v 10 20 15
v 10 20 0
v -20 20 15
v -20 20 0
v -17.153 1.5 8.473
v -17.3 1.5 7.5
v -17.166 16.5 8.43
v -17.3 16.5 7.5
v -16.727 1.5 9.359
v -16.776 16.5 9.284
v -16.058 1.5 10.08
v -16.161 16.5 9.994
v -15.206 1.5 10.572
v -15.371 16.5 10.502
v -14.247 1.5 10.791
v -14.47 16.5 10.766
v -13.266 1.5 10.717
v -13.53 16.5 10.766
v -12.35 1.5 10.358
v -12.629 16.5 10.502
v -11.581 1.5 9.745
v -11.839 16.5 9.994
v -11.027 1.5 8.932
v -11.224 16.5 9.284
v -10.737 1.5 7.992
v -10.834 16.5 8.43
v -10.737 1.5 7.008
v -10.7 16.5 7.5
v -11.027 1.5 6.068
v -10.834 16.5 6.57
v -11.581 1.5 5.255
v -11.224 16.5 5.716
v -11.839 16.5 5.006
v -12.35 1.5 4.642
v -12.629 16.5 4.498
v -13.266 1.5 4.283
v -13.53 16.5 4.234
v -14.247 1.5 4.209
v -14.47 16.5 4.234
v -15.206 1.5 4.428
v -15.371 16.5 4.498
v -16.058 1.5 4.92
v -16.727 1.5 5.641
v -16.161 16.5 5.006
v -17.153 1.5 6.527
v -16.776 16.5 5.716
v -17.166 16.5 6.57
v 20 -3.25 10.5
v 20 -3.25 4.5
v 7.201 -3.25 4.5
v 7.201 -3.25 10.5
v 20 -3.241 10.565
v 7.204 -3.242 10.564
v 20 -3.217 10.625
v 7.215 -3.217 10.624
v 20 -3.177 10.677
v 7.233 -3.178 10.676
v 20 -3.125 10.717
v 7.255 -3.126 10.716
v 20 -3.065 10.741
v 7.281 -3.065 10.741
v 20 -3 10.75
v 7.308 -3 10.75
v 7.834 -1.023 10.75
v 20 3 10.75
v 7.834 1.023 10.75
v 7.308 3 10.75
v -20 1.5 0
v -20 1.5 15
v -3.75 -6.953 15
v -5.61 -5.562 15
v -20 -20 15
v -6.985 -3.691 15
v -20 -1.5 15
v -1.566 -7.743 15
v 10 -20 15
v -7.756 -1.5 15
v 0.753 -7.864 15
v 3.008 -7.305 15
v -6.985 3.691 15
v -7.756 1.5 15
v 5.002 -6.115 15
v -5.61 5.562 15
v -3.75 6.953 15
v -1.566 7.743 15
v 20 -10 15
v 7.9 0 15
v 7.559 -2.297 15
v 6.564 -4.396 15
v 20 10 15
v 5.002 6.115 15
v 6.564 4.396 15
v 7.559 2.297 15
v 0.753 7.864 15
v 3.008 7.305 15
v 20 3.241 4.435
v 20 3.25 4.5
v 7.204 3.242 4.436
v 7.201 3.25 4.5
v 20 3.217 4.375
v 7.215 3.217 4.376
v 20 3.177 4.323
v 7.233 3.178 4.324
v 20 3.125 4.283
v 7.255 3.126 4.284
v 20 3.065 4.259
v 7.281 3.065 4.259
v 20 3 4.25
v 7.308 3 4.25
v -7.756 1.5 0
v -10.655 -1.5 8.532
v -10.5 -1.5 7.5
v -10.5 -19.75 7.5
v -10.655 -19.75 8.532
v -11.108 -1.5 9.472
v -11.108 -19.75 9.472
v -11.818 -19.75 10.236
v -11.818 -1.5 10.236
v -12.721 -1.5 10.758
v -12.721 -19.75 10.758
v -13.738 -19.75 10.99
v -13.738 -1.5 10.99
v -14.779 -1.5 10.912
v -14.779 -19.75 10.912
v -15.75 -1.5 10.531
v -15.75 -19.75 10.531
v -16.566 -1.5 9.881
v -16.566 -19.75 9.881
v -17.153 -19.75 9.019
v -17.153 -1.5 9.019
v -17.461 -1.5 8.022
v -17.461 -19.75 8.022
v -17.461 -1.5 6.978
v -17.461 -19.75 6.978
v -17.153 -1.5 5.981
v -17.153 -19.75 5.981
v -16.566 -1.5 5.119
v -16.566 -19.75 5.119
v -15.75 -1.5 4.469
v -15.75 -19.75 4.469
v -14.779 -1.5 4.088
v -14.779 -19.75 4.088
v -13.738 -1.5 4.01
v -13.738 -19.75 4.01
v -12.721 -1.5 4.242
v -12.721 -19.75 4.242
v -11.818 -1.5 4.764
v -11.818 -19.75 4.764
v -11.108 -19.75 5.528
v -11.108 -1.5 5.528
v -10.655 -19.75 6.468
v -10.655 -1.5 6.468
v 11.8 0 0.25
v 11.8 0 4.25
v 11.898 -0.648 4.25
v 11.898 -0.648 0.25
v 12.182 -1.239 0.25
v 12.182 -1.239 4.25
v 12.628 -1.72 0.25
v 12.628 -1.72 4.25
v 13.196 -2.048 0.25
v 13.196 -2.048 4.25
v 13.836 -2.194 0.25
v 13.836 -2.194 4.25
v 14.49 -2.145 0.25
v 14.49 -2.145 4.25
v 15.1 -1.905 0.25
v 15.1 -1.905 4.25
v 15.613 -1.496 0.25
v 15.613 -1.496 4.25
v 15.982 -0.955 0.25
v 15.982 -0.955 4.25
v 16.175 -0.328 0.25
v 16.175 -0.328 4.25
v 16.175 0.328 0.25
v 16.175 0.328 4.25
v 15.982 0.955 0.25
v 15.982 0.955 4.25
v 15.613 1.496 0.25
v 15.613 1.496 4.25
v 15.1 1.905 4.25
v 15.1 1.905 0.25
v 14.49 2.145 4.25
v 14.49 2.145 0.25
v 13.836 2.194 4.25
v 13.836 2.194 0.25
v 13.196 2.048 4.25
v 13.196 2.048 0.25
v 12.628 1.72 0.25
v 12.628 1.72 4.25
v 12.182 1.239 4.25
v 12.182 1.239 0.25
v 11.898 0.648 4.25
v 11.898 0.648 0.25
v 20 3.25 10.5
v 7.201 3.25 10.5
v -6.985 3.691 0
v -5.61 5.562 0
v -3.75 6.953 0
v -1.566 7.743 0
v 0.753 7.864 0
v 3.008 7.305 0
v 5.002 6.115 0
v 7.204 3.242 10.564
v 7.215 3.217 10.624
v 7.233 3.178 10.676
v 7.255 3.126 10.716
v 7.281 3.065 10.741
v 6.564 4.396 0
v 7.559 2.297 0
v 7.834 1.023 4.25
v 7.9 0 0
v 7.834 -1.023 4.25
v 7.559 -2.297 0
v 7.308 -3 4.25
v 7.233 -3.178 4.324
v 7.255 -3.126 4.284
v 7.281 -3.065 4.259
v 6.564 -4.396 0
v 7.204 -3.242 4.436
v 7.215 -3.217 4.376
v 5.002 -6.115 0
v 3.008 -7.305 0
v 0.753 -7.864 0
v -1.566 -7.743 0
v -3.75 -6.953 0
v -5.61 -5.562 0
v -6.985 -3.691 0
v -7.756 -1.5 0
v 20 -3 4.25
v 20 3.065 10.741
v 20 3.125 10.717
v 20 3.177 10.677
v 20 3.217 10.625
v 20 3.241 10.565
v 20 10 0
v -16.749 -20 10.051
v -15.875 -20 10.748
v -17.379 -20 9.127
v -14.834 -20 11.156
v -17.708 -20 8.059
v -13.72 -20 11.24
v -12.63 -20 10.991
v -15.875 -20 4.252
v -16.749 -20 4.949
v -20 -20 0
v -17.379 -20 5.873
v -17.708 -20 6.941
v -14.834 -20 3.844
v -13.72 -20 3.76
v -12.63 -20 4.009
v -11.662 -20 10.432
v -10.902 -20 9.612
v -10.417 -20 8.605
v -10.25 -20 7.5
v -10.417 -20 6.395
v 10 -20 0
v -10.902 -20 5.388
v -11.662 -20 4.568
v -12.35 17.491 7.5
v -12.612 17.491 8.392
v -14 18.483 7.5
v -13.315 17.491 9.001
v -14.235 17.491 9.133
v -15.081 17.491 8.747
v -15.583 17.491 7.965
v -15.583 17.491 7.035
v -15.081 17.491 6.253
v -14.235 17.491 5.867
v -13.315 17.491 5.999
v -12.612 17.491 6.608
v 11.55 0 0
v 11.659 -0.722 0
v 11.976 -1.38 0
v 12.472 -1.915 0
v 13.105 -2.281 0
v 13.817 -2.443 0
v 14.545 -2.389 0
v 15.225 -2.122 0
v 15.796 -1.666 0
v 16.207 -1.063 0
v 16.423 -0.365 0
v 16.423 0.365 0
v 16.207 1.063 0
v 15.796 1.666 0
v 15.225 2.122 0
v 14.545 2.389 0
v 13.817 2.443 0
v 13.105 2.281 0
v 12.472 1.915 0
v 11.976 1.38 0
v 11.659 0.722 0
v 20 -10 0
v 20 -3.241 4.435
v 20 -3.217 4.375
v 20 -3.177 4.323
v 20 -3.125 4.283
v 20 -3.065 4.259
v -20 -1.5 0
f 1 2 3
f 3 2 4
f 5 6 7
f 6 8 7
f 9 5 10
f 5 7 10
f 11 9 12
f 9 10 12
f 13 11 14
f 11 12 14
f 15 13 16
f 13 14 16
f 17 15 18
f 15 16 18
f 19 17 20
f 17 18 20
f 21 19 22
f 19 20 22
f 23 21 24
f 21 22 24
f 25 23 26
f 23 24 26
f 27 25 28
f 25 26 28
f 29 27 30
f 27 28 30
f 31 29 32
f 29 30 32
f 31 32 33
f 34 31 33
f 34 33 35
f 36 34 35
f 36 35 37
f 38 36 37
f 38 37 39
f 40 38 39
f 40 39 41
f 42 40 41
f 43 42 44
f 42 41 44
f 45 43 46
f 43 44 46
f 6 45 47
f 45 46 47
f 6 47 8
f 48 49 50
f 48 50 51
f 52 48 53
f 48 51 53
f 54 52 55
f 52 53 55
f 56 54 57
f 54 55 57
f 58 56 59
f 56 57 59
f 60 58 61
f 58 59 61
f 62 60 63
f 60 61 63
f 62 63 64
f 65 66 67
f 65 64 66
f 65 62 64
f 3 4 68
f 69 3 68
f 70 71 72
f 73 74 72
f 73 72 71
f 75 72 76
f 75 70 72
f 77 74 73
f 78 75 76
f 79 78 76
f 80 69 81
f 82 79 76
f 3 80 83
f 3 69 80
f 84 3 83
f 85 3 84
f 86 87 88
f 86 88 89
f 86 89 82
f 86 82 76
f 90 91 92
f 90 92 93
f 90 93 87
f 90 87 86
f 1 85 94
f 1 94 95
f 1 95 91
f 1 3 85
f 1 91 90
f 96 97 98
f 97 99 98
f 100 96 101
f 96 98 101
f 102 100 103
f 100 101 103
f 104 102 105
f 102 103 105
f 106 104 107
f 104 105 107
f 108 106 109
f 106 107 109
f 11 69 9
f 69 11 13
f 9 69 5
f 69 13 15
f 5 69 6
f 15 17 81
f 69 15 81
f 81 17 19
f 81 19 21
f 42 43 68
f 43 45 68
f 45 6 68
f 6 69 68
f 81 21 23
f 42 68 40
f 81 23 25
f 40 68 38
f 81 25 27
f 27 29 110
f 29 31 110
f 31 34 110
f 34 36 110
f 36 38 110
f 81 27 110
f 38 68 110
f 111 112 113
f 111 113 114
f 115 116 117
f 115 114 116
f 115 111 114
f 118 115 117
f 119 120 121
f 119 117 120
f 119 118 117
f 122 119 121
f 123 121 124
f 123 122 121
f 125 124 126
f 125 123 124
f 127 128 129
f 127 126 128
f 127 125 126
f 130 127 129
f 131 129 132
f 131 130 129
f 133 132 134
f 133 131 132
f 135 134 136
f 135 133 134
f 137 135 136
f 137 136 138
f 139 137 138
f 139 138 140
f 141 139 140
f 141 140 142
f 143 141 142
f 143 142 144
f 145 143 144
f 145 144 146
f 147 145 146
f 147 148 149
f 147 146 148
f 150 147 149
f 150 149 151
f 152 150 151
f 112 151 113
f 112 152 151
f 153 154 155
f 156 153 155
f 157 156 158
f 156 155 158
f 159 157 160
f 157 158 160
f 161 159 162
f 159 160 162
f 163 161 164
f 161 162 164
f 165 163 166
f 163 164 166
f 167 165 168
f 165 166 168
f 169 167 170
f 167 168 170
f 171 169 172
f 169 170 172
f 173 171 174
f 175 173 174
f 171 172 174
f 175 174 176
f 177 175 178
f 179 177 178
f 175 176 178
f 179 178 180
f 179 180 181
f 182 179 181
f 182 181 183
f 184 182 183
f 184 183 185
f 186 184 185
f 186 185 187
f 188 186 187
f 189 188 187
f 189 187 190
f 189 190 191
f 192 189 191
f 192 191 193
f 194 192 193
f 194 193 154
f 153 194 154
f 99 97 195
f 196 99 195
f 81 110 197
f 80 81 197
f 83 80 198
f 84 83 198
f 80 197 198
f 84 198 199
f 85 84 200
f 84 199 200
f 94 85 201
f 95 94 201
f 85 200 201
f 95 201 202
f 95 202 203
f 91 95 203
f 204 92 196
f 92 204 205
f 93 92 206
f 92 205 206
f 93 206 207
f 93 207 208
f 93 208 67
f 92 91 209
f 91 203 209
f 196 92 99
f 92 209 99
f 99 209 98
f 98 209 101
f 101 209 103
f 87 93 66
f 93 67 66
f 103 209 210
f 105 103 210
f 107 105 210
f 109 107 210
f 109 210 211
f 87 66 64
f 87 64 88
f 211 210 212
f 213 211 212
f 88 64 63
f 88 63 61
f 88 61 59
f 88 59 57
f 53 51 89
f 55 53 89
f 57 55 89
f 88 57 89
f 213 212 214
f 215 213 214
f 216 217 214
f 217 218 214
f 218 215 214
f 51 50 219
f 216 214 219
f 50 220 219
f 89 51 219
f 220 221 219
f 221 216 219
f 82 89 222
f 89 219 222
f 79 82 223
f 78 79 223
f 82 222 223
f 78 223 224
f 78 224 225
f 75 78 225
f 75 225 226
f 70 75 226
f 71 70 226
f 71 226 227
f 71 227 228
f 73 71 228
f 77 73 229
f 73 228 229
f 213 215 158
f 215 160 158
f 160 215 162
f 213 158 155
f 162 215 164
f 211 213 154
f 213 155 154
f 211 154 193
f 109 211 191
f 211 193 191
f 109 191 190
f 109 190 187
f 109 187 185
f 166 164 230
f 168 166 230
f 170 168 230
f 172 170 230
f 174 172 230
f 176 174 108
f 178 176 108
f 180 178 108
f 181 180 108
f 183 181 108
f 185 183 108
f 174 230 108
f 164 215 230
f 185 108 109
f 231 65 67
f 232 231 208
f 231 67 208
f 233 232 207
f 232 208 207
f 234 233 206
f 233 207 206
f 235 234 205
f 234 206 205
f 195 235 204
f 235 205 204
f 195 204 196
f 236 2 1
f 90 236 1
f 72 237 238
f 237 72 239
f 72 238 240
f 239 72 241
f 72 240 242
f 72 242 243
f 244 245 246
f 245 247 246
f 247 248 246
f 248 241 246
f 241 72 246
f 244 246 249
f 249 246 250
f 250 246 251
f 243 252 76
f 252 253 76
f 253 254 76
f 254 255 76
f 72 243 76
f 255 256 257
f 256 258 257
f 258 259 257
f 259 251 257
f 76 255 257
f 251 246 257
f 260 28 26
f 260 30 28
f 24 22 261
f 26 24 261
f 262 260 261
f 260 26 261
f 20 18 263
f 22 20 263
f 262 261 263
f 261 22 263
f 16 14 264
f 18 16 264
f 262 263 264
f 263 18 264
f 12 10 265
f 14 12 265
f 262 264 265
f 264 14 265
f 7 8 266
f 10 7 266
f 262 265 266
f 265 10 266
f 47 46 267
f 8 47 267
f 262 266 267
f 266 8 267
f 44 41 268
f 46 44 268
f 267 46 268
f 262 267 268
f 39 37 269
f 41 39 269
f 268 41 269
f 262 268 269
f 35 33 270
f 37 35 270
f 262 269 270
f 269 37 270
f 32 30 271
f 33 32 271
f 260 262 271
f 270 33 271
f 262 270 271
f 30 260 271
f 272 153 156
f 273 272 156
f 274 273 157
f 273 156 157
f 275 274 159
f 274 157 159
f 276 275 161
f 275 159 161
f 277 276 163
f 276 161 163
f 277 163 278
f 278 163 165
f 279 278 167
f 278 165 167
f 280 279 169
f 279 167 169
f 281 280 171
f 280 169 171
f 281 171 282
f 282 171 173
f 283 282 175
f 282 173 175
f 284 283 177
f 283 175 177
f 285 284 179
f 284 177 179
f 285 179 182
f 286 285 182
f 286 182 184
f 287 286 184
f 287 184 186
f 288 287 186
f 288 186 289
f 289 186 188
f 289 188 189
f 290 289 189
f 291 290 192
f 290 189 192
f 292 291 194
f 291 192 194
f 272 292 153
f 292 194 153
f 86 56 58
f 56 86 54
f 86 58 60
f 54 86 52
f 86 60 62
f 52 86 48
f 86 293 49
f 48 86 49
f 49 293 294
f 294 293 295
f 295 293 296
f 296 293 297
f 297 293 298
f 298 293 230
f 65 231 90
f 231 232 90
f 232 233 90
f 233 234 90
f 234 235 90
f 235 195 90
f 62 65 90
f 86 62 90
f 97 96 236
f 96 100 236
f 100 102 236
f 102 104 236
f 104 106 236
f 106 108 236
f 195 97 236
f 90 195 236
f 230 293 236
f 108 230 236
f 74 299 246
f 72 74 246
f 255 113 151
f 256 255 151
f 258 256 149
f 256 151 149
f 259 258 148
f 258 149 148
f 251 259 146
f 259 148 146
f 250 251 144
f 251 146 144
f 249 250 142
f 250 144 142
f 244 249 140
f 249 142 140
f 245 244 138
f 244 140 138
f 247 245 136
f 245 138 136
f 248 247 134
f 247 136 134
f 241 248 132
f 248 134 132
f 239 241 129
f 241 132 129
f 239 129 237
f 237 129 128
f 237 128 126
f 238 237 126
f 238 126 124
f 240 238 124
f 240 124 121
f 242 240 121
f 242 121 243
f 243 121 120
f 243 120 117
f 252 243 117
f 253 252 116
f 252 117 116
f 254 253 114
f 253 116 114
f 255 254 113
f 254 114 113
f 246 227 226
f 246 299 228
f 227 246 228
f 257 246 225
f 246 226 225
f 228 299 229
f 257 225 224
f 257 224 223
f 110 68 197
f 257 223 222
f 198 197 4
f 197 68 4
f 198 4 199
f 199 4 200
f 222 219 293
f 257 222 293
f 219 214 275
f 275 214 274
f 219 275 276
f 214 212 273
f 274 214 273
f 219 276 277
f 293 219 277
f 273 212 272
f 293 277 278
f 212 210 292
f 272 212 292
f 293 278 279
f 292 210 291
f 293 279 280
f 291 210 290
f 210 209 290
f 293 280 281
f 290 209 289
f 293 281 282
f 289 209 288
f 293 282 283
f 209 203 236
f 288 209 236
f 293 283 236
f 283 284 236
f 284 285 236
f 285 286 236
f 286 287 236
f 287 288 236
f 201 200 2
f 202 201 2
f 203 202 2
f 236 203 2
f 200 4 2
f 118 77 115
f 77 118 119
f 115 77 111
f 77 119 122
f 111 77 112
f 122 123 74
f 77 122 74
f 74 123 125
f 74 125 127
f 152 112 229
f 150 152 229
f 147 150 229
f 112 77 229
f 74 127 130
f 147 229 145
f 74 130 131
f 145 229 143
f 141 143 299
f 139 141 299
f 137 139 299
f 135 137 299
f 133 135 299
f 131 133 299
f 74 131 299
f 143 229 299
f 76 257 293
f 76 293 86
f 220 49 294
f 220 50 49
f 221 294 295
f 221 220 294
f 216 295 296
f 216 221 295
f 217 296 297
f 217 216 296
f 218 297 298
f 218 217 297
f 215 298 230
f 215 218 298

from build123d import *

# Parameters (mm, degrees)
F1_DEPTH  = 15
F2_R      = 3.5
F3_DEPTH  = 25
F5_D      = 6.6
F5_DEPTH  = 15
F5_TIP    = 1.9828400428
F6_SIZE   = 10
F7_W      = 6.5
F7_H      = 6.5
F8_DEPTH  = 12.8004791855
F10_D     = 4.4
F10_DEPTH = 5
F10_TIP   = 1.3218933619
F11_SIZE  = 0.25
F12_R     = 0.25


with BuildPart() as f1:
    # F0 (on Top) → F1 (new body)
    with BuildSketch(Plane.XY):
        with BuildLine():
            Line((20, -20), (20, 20))
            Line((20, 20), (-20, 20))
            Line((-20, 20), (-20, 1.5))
            Line((-20, 1.5), (-7.7562877719, 1.5))
            ThreePointArc((-7.7562877719, 1.5), (7.9, 0), (-7.7562877719, -1.5))
            Line((-7.7562877719, -1.5), (-20, -1.5))
            Line((-20, -1.5), (-20, -20))
            Line((-20, -20), (20, -20))
        make_face()
    extrude(amount=F1_DEPTH)

    # F2 (on Front) → F3 (cut)
    with BuildSketch(Plane.XZ):
        with Locations((-14, 7.5)):
            Circle(F2_R)
    extrude(amount=F3_DEPTH, mode=Mode.SUBTRACT)

    # F5
    with Locations(Plane.XZ.offset(-1.5)):
        with Locations((-14, 7.5)):
            Hole(F5_D / 2, depth=F5_DEPTH)
            with Locations((0, 0, -(F5_DEPTH + F5_TIP / 2))):  # 118° drill point
                Cone(0, F5_D / 2, F5_TIP, mode=Mode.SUBTRACT)

    # F6
    f6_edges = [f1.edges().sort_by_distance(p)[0] for p in [
        (20, -20, 7.5),
        (20, 20, 7.5),
    ]]
    chamfer(f6_edges, length=F6_SIZE)

    # F7 (on face) → F8 (cut, through all)
    with BuildSketch(Plane.YZ.offset(20)):
        with Locations((0, 7.5)):
            Rectangle(F7_W, F7_H)
    extrude(amount=-F8_DEPTH, mode=Mode.SUBTRACT)

    # F10
    with Locations(Plane(origin=(0, 0, 0), x_dir=(1, 0, 0), z_dir=(0, 0, -1))):
        with Locations((14, 0)):
            Hole(F10_D / 2, depth=F10_DEPTH)
            with Locations((0, 0, -(F10_DEPTH + F10_TIP / 2))):  # 118° drill point
                Cone(0, F10_D / 2, F10_TIP, mode=Mode.SUBTRACT)

    # F11
    f11_edges = [f1.edges().sort_by_distance(p)[0] for p in [
        (-17.5, -20, 7.5),
        (11.8, 0, 0),
    ]]
    chamfer(f11_edges, length=F11_SIZE)

    # F12
    f12_edges = [f1.edges().sort_by_distance(p)[0] for p in [
        (13.60026, 3.25, 4.25),
        (13.60026, -3.25, 4.25),
        (13.60026, 3.25, 10.75),
        (13.60026, -3.25, 10.75),
    ]]
    fillet(f12_edges, radius=F12_R)


solid = f1.part
